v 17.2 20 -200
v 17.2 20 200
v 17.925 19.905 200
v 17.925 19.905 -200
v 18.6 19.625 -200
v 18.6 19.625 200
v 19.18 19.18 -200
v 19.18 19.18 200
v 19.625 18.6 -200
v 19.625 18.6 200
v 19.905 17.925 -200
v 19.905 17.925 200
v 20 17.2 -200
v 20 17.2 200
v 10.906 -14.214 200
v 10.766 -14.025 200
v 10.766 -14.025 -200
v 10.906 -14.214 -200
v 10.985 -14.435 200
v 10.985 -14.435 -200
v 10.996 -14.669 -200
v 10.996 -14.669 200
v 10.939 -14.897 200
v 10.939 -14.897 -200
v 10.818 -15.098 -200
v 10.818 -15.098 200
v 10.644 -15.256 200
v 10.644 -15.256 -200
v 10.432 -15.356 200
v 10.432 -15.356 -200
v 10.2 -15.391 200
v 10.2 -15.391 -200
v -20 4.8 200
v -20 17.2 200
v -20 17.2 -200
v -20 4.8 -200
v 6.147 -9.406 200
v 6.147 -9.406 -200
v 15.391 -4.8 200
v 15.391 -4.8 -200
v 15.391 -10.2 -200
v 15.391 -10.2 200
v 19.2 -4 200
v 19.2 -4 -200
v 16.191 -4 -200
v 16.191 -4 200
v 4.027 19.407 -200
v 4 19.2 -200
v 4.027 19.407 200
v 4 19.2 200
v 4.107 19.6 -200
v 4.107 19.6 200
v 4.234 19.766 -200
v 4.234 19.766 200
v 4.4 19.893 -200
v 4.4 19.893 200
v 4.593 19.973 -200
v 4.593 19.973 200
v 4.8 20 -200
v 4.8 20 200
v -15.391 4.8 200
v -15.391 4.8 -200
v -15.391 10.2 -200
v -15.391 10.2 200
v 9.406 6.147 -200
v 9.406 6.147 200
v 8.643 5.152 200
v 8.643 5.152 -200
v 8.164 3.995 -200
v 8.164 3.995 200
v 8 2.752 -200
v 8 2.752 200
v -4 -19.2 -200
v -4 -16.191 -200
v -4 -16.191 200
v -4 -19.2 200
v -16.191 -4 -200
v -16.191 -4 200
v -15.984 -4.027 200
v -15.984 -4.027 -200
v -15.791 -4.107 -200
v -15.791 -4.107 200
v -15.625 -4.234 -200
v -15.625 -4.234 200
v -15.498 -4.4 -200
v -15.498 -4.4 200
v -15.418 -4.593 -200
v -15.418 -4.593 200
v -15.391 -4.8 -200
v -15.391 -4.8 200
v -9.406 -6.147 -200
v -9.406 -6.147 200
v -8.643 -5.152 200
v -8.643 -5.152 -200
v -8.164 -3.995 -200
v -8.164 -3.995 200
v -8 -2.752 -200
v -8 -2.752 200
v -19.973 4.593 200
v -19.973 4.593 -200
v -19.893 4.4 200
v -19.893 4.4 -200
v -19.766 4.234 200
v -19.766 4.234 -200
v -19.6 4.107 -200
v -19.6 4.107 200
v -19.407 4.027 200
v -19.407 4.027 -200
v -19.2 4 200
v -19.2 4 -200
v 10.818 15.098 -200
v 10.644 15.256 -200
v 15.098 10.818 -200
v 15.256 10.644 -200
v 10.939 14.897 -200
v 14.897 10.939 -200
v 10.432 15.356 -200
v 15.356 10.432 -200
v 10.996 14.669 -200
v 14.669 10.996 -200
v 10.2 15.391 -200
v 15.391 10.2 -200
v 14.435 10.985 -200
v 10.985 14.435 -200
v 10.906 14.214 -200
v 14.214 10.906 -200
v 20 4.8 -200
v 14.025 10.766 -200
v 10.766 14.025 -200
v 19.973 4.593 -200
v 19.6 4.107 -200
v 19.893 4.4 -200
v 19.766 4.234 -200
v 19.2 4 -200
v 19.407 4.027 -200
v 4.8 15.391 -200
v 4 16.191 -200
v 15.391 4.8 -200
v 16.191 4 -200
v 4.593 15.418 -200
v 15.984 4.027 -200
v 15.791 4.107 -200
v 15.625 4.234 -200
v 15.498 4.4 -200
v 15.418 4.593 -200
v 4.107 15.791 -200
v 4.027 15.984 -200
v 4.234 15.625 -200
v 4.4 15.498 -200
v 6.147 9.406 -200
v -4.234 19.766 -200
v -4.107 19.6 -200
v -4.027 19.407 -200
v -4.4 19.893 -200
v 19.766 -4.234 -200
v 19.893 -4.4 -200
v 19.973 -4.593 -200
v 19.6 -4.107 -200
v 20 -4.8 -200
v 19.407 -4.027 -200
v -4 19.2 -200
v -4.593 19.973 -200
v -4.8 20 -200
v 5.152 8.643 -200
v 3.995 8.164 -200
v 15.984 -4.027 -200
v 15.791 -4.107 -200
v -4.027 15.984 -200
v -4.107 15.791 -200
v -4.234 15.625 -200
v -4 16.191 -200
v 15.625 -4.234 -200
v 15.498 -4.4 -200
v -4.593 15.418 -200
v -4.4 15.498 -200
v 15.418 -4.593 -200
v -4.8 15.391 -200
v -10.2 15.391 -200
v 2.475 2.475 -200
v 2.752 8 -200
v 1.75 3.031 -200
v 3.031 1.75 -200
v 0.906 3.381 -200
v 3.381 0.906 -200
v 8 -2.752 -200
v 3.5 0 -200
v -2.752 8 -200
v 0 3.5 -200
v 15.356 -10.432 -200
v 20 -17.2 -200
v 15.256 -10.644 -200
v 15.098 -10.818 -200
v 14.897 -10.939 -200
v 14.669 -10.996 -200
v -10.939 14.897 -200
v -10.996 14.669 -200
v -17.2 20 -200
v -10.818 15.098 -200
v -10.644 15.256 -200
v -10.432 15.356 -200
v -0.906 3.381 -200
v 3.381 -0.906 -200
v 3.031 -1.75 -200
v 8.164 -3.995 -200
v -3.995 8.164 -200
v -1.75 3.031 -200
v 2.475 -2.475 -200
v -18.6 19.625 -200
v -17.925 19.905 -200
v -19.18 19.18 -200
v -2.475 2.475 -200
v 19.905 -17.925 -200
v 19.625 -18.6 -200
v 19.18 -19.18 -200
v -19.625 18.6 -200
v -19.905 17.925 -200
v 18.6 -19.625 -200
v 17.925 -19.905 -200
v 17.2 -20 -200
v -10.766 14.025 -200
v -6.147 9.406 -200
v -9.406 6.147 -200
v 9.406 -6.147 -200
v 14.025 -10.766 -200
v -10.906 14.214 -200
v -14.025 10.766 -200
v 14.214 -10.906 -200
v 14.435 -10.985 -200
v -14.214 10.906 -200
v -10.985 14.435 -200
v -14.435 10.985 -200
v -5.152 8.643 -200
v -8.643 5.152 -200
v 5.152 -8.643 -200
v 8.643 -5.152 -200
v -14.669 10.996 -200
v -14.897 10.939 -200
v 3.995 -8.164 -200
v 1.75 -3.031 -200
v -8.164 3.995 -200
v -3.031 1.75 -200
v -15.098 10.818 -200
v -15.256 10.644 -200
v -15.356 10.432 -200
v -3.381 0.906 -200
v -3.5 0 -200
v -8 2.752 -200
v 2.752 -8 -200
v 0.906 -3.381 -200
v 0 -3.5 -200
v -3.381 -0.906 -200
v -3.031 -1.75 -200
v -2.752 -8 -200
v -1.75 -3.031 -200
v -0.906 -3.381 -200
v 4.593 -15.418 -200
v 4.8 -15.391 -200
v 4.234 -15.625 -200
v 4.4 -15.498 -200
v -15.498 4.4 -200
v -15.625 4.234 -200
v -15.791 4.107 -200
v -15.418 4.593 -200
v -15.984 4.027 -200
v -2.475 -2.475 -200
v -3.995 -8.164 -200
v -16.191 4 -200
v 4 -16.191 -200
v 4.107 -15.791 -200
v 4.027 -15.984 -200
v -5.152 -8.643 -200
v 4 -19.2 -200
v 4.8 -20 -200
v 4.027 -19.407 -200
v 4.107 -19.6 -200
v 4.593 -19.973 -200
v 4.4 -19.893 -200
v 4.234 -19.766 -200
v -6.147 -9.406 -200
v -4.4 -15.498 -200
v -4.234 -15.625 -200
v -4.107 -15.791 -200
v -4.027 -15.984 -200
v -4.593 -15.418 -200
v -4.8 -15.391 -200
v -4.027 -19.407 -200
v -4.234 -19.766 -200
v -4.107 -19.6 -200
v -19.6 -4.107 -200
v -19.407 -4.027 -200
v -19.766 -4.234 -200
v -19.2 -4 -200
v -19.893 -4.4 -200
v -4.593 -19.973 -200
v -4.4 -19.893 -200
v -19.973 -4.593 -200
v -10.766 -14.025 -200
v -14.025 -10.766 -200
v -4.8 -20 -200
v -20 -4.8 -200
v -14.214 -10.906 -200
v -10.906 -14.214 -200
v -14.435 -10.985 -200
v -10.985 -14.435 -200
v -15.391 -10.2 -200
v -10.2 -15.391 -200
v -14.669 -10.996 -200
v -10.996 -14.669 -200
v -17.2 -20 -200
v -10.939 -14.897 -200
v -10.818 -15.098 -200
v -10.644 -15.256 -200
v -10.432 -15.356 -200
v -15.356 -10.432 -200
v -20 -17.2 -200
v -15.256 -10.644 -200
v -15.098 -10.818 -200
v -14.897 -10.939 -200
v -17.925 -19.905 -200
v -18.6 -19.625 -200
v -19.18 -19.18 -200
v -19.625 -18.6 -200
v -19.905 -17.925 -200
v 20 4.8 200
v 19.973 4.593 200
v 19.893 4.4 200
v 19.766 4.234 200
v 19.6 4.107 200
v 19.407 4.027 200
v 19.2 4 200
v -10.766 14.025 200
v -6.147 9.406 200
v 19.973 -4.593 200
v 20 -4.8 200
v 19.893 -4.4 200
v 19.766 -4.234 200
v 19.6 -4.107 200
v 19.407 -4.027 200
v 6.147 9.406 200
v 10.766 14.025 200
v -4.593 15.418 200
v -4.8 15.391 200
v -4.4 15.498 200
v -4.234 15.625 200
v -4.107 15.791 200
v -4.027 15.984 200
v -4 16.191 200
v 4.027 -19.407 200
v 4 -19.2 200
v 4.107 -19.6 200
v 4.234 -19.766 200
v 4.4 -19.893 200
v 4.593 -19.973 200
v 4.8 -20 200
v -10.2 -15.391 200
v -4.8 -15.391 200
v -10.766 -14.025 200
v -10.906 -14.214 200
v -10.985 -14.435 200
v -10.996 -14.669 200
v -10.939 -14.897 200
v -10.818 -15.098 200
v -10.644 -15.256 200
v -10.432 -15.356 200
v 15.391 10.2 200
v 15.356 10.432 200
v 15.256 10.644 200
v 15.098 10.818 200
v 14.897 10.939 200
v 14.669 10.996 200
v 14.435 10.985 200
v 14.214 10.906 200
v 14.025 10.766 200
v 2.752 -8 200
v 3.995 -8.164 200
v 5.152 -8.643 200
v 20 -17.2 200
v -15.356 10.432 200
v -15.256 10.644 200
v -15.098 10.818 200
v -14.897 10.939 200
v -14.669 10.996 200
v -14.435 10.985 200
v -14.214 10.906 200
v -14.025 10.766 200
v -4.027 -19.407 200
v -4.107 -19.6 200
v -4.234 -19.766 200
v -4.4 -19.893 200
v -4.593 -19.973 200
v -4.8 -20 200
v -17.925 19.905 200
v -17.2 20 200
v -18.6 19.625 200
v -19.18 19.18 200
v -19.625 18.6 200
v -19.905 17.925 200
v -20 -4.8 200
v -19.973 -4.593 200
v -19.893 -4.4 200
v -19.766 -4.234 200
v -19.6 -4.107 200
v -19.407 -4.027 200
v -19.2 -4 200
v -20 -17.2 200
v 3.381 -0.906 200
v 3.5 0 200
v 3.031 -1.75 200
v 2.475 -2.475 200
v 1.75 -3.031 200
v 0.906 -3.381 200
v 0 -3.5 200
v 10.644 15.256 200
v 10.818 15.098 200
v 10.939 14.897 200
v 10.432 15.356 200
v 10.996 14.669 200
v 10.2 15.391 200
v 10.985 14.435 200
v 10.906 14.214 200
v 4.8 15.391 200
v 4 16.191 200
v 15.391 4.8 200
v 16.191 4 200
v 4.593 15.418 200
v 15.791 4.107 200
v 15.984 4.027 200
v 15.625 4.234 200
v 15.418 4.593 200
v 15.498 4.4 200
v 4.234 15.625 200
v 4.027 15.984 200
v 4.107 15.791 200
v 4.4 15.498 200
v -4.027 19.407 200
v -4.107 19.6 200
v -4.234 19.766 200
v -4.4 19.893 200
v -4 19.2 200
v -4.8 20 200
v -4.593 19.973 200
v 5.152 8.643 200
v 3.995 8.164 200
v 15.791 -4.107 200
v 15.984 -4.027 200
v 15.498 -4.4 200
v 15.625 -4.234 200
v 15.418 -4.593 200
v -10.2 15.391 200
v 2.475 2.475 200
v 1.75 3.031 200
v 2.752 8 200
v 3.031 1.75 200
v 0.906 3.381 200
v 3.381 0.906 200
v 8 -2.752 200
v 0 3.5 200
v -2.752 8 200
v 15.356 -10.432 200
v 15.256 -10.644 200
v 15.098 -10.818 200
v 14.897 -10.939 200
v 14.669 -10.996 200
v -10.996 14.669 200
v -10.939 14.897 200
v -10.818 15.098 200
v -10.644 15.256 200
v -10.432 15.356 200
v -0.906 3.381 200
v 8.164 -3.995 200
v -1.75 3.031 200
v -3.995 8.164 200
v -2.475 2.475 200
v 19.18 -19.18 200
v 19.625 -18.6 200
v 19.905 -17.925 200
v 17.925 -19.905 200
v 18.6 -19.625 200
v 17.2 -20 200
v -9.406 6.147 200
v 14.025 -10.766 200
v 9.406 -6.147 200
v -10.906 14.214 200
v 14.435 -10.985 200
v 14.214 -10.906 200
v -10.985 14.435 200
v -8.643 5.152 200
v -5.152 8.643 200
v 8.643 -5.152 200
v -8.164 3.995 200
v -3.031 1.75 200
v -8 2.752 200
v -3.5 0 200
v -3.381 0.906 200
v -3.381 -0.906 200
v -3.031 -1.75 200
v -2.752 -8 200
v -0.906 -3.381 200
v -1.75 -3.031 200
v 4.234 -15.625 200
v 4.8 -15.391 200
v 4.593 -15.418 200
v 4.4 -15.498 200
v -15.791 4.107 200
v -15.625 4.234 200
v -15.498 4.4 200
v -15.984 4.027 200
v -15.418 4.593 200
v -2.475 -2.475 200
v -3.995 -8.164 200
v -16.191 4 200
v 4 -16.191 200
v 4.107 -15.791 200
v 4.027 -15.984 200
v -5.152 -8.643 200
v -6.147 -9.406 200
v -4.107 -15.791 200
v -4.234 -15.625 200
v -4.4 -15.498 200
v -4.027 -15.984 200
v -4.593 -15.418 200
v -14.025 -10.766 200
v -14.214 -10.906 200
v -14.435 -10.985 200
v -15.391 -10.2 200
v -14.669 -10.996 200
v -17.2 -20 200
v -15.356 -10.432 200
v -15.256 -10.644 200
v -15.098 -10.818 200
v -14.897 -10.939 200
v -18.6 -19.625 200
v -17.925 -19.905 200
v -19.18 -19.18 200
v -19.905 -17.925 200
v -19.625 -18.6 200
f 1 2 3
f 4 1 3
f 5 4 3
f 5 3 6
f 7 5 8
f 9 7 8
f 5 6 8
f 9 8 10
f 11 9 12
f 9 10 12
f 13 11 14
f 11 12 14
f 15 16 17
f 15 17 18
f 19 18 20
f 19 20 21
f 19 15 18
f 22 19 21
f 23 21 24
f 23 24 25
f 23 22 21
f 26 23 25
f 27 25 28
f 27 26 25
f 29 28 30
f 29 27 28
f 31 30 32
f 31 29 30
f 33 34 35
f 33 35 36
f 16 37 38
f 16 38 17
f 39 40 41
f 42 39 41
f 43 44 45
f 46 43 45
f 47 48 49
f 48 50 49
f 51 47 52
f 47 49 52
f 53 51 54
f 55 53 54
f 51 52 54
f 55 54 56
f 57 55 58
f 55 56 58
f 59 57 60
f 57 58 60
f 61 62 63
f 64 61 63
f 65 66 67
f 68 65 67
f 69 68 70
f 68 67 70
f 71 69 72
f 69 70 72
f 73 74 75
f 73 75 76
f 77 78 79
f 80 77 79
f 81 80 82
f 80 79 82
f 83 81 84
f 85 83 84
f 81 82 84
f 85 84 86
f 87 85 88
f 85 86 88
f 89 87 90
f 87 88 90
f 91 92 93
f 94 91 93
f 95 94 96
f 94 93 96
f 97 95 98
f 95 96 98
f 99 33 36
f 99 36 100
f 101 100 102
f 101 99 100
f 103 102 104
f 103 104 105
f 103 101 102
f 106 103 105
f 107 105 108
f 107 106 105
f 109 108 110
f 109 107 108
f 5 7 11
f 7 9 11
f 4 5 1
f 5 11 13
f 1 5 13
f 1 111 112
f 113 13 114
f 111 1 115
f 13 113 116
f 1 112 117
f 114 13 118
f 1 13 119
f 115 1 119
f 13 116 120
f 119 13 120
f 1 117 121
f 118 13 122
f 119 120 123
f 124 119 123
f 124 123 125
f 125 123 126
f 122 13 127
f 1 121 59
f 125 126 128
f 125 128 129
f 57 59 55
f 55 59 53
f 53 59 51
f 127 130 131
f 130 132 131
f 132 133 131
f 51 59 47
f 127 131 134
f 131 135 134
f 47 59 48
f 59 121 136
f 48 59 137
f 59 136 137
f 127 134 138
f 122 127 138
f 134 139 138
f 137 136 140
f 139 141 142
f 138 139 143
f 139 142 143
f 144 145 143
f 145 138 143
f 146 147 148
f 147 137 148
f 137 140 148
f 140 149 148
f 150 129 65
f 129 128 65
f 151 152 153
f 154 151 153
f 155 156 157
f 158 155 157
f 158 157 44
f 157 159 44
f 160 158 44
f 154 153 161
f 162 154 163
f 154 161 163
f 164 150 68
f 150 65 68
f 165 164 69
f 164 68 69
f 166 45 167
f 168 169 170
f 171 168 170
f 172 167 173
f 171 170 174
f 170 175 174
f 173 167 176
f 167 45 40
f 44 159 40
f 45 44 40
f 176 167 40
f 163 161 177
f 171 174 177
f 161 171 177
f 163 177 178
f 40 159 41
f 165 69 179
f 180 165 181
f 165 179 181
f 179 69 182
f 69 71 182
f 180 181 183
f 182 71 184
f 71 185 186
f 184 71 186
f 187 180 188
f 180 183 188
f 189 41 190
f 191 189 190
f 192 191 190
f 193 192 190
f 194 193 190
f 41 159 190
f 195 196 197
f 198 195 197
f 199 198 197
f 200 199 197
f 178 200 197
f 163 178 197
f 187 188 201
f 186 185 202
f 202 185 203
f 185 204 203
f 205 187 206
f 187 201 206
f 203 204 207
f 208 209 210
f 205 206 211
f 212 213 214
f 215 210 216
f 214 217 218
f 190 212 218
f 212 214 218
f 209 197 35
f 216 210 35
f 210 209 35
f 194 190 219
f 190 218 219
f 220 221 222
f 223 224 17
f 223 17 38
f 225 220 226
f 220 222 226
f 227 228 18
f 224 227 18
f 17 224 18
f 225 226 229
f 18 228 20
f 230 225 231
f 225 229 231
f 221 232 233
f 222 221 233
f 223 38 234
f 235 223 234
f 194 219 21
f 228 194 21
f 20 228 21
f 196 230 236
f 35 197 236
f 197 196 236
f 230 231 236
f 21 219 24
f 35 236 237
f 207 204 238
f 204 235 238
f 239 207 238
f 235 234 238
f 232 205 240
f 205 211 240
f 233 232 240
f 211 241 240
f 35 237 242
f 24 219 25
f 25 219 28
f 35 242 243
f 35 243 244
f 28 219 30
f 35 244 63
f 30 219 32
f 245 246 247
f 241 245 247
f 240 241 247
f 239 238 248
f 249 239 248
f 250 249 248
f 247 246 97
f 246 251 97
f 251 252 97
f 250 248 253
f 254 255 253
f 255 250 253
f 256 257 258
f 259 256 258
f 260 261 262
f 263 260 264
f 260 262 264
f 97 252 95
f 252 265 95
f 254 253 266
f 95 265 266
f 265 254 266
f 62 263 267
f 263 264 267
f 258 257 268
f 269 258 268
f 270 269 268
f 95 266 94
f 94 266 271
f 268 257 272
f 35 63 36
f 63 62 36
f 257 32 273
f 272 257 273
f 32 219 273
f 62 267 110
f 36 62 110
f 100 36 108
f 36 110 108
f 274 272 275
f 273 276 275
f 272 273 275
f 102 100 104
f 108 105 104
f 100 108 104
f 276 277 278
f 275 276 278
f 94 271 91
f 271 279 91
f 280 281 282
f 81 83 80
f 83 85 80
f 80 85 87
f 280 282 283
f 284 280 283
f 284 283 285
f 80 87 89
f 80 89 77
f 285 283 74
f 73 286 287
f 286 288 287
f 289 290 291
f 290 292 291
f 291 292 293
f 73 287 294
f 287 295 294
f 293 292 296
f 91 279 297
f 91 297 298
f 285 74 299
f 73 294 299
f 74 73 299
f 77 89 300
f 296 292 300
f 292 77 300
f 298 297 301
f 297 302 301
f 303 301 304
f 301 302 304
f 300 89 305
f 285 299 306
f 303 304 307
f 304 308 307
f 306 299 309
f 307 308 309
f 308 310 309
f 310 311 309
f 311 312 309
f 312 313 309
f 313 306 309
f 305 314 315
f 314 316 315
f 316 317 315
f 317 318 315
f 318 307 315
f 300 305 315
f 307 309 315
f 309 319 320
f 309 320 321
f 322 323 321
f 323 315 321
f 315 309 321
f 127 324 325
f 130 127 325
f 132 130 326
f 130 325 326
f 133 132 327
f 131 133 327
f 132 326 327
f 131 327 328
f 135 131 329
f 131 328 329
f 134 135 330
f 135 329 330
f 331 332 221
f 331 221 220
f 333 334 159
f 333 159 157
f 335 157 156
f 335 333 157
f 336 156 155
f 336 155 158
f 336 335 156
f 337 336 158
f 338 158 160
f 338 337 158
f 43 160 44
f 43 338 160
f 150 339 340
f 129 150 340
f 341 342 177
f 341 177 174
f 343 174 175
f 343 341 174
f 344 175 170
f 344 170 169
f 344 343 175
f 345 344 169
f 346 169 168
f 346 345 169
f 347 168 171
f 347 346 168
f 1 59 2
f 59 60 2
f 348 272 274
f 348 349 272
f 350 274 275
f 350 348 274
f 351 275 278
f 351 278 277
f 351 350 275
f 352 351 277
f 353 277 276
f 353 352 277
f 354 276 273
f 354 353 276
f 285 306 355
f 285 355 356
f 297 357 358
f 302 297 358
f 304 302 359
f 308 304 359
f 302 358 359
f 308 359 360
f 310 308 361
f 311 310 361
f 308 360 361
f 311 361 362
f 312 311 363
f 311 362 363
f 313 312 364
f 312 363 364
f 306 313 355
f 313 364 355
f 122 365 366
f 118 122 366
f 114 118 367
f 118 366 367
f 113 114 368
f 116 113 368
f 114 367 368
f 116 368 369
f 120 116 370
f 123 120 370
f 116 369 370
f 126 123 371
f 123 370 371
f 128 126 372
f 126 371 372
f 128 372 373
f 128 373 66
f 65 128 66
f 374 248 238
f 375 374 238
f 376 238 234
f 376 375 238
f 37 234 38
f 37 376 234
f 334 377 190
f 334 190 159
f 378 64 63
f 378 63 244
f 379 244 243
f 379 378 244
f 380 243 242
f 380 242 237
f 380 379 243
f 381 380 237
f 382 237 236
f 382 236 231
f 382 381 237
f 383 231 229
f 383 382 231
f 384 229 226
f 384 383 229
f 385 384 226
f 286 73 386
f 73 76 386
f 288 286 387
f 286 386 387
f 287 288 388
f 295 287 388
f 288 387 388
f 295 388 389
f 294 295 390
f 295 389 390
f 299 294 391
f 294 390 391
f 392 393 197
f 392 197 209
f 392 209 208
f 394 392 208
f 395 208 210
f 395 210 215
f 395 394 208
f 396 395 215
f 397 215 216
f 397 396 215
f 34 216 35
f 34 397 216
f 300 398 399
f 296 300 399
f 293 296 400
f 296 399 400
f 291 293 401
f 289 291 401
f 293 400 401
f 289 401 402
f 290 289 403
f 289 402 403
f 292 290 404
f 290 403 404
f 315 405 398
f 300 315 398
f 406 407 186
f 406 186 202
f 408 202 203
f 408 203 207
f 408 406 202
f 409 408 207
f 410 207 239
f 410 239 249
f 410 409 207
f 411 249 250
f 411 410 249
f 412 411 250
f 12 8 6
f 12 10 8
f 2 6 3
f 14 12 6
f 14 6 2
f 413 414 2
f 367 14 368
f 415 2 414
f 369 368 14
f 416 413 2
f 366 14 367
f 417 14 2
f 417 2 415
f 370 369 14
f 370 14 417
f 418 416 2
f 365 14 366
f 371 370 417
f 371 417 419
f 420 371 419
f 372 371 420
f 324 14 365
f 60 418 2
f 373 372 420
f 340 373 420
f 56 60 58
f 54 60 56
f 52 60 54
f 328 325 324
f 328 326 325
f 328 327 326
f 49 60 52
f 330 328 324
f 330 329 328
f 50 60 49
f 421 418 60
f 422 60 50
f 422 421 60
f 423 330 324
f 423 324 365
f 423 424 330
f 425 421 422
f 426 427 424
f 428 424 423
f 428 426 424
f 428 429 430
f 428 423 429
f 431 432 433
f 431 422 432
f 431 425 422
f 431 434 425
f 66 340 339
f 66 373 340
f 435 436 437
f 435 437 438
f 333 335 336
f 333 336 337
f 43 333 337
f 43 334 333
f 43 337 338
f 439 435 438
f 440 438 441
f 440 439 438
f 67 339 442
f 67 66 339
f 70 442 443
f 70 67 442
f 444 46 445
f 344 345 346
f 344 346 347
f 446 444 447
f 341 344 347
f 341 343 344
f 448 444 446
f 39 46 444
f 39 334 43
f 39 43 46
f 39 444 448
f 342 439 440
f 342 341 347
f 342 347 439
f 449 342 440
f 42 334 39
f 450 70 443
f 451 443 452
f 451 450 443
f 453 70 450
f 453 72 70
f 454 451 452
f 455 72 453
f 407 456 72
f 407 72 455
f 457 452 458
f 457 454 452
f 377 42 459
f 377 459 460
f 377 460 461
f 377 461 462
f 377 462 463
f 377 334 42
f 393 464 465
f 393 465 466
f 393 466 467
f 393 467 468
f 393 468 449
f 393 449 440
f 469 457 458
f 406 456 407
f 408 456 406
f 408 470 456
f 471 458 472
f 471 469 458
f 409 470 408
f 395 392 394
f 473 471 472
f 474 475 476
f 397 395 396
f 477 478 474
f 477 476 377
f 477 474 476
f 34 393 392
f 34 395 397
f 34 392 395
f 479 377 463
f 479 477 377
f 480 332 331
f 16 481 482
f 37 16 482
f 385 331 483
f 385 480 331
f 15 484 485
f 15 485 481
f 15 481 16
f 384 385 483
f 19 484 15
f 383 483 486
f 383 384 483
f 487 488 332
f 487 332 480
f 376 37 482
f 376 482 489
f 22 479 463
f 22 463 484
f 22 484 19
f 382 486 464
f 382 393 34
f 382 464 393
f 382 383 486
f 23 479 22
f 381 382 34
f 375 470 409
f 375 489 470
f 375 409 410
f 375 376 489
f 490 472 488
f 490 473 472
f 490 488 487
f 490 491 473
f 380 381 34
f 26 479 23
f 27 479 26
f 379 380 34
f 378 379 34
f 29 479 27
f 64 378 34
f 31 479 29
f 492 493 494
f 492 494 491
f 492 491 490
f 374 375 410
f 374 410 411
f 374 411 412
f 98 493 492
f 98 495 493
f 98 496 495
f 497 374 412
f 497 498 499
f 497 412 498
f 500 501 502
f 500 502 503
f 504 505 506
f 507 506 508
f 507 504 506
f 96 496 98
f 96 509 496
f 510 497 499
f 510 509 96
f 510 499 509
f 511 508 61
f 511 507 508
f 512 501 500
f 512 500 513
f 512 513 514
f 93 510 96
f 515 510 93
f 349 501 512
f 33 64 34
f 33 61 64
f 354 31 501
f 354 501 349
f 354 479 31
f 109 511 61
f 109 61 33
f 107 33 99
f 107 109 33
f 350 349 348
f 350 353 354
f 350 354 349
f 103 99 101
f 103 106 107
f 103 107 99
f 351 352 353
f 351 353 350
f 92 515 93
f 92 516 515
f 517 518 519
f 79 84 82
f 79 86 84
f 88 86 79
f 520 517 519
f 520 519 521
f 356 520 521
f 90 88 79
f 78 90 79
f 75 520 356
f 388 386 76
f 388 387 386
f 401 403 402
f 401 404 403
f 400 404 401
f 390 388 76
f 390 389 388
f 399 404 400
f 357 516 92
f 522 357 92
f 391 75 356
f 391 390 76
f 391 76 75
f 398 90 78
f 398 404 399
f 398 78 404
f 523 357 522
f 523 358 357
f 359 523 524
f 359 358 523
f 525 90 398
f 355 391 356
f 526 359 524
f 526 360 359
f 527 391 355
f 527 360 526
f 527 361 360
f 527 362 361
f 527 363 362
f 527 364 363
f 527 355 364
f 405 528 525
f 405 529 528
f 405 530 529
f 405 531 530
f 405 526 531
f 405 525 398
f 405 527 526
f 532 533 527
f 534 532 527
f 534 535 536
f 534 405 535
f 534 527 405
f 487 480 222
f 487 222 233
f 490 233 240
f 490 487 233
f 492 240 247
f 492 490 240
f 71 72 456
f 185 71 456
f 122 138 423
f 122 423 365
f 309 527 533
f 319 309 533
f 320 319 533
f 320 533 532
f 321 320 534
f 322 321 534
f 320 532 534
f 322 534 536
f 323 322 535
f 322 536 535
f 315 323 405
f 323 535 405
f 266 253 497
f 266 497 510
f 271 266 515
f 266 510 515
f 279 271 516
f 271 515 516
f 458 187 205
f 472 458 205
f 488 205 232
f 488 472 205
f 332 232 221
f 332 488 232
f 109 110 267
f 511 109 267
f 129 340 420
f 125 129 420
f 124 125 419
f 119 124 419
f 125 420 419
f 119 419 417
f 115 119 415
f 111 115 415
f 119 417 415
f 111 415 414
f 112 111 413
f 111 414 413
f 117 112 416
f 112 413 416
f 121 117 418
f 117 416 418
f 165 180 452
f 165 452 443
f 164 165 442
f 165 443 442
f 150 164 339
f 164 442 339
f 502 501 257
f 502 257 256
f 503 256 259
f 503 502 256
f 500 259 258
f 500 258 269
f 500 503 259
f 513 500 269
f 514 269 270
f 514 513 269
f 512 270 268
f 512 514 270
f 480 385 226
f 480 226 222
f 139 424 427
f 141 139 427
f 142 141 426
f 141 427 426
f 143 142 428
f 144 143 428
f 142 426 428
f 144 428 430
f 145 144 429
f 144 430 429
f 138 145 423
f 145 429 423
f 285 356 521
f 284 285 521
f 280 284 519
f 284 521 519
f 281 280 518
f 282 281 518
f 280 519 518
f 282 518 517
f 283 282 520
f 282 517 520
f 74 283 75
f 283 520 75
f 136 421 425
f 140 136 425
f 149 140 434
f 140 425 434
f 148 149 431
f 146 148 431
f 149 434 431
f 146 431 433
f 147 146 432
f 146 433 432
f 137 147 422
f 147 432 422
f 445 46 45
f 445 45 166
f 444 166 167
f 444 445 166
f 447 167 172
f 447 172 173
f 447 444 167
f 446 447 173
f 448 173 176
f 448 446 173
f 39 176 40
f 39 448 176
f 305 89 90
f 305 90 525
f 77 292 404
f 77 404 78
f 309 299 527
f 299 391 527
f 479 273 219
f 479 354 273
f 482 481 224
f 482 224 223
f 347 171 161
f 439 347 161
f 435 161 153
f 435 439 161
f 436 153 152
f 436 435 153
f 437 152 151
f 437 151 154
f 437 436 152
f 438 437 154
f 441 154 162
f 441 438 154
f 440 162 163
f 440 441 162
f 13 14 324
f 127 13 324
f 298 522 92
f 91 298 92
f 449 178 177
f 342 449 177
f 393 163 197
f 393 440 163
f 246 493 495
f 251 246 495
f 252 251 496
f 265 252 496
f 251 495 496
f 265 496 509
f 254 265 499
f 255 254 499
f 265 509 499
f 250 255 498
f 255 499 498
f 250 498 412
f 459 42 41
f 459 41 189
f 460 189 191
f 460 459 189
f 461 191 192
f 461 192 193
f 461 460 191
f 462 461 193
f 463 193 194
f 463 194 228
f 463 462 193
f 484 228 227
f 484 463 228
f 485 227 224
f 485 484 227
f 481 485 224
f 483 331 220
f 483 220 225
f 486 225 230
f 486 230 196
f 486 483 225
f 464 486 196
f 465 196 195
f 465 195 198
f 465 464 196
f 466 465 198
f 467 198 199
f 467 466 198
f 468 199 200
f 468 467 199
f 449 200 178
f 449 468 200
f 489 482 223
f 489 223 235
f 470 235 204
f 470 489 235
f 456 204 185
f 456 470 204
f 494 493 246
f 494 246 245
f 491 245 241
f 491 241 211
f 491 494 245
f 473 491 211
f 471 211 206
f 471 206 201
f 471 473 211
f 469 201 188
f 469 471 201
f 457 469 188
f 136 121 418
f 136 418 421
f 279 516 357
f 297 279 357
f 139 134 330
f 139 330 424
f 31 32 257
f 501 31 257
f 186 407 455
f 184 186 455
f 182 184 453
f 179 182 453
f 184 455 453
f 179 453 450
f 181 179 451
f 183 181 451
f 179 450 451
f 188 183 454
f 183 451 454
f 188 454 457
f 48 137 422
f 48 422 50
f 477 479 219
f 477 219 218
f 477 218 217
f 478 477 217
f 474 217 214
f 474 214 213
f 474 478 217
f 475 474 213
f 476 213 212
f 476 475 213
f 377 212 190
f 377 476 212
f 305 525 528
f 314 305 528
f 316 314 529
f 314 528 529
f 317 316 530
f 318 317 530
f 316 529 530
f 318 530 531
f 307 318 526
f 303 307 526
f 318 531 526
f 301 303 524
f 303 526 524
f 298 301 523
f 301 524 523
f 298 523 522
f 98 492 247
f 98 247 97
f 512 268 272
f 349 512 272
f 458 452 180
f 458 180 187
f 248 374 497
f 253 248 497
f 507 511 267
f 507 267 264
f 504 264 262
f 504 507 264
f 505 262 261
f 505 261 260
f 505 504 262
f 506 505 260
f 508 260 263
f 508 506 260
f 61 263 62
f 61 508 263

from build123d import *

# Parameters (mm, degrees)
BOSS_EXTRUDE1_DEPTH = 200


with BuildPart() as part:
    # Sketch4 → Boss-Extrude1 (new body, symmetric)
    with BuildSketch(Plane.XY):
        with BuildLine():
            Line((4.8, -20), (17.2, -20))
            ThreePointArc((17.2, -20), (19.179898987, -19.179898987), (20, -17.2))
            Line((20, -17.2), (20, -4.8))
            ThreePointArc((20, -4.8), (19.765685425, -4.234314575), (19.2, -4))
            Line((19.2, -4), (16.190663761, -4))
            ThreePointArc((16.190663761, -4), (15.624978336, -4.234314575), (15.390663761, -4.8))
            Line((15.390663761, -4.8), (15.390663761, -10.2))
            ThreePointArc((15.390663761, -10.2), (14.896810507, -10.939103626), (14.024978336, -10.765685425))
            Line((14.024978336, -10.765685425), (9.40588745, -6.146594539))
            ThreePointArc((9.40588745, -6.146594539), (8.365378244, -4.589362465), (8, -2.752481989))
            Line((8, -2.752481989), (8, 0))
            Line((8, 0), (3.5, 0))
            ThreePointArc((3.5, 0), (2.474873734, -2.474873734), (0, -3.5))
            Line((0, -3.5), (0, -8))
            Line((0, -8), (2.752481989, -8))
            ThreePointArc((2.752481989, -8), (4.589362465, -8.365378244), (6.146594539, -9.40588745))
            Line((6.146594539, -9.40588745), (10.765685425, -14.024978336))
            ThreePointArc((10.765685425, -14.024978336), (10.939103626, -14.896810507), (10.2, -15.390663761))
            Line((10.2, -15.390663761), (4.8, -15.390663761))
            ThreePointArc((4.8, -15.390663761), (4.234314575, -15.624978336), (4, -16.190663761))
            Line((4, -16.190663761), (4, -19.2))
            ThreePointArc((4, -19.2), (4.234314575, -19.765685425), (4.8, -20))
        make_face()
    extrude(amount=BOSS_EXTRUDE1_DEPTH, both=True)

    # Mirror1: part across plane


with BuildPart() as part_1:
    add(part.part)
    add(part.part.mirror(Plane(origin=(0, 0, 0), x_dir=(0, 0, 1), z_dir=(1, 0, 0))))

    # Mirror2: part across plane


with BuildPart() as part_2:
    add(part_1.part)
    add(part_1.part.mirror(Plane.ZX))


solid = part_2.part
